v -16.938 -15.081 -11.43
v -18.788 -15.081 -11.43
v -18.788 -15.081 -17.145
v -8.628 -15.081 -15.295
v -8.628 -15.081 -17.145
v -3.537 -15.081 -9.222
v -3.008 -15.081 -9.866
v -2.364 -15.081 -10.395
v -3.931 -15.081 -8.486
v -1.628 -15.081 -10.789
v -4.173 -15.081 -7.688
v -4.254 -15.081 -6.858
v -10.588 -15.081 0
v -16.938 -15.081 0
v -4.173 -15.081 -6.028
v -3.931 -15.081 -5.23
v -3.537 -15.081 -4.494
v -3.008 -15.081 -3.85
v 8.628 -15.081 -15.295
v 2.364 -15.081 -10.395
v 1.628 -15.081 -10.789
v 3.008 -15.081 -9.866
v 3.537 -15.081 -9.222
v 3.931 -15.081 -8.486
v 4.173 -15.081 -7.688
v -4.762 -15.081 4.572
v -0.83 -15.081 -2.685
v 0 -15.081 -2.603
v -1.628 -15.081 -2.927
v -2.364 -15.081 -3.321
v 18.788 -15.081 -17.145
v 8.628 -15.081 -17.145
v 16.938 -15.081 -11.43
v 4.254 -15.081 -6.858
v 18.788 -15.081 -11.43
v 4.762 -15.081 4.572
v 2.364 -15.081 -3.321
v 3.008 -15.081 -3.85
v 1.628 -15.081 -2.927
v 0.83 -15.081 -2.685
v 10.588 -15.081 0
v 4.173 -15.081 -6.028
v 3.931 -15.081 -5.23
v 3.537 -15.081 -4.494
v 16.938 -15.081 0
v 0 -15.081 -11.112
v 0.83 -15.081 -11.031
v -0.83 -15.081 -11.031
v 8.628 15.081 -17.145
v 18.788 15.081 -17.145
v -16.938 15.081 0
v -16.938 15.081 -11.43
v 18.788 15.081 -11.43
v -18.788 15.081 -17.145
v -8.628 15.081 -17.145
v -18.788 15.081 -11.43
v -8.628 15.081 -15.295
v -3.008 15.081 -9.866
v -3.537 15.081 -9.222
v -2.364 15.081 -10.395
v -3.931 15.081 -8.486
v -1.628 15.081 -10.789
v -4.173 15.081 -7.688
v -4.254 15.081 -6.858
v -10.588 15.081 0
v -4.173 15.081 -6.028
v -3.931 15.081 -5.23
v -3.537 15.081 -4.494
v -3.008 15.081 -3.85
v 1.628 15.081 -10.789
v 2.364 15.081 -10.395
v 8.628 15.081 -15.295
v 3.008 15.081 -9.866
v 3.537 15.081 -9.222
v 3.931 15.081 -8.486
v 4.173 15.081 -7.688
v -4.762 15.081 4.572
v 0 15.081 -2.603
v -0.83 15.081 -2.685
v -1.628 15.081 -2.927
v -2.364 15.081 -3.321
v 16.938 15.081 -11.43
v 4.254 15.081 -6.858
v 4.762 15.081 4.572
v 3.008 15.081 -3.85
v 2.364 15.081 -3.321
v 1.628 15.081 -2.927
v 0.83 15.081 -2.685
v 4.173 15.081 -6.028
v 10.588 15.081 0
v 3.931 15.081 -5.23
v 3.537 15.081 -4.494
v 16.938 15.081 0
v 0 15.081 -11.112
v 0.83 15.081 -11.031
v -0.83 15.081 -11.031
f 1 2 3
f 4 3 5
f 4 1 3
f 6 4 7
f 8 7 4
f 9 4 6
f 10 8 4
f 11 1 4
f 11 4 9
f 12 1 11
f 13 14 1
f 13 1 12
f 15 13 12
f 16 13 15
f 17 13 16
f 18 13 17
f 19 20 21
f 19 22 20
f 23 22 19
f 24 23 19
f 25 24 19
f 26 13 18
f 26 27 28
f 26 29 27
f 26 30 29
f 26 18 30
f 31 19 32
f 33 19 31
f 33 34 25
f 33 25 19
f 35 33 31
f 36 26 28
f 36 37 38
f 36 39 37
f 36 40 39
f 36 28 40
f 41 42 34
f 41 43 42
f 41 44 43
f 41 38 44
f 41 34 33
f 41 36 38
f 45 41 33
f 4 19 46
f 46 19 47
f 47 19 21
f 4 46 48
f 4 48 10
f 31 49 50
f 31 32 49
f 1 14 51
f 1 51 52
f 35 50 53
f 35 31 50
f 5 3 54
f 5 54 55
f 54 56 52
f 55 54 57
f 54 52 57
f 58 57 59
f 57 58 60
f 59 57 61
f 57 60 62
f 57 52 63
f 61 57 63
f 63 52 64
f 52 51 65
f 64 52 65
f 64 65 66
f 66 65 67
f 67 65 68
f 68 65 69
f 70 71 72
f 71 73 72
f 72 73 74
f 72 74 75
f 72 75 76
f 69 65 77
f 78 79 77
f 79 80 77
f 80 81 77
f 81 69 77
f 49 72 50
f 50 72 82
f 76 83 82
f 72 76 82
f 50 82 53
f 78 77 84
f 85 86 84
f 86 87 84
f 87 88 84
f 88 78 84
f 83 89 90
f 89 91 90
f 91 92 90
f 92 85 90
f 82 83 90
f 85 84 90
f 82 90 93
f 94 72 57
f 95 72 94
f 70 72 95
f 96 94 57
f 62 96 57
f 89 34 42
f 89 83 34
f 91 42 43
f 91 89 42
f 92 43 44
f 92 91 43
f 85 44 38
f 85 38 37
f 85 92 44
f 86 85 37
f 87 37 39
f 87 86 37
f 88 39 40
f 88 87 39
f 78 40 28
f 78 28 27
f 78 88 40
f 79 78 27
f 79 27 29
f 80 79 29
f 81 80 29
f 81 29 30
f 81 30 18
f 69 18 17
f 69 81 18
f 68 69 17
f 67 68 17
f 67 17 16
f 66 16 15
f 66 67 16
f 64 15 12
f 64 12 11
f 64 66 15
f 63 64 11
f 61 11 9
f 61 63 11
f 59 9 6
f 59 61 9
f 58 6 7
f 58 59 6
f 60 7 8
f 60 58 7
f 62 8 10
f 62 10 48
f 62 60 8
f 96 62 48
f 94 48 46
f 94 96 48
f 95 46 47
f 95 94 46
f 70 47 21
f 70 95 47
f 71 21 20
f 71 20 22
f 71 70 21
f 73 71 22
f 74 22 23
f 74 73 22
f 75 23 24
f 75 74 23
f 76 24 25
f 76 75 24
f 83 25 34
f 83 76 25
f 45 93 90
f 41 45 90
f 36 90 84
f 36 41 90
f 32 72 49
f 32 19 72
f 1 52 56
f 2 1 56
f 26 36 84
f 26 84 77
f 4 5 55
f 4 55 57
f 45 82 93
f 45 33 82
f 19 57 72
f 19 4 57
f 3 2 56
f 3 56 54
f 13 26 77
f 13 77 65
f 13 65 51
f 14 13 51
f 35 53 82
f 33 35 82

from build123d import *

# Parameters (mm, degrees)
F0_R     = 4.2545
F1_DEPTH = 15.08125


with BuildPart() as f1:
    # F0 (on Front) → F1 (new body, symmetric)
    with BuildSketch(Plane.XZ):
        Polygon((10.588473, 0), (4.7625, 4.572), (0, 4.572), (-4.7625, 4.572), (-10.588473, 0), (-16.938473, 0), (-16.938473, -11.43), (-18.787988, -11.43), (-18.787988, -17.145), (-8.627988, -17.145), (-8.627988, -15.295486), (0, -15.295486), (8.627988, -15.295486), (8.627988, -17.145), (18.787988, -17.145), (18.787988, -11.43), (16.938473, -11.43), (16.938473, 0), align=None)
        with Locations((0, -6.858)):
            Circle(F0_R, mode=Mode.SUBTRACT)
    extrude(amount=F1_DEPTH, both=True)


solid = f1.part
